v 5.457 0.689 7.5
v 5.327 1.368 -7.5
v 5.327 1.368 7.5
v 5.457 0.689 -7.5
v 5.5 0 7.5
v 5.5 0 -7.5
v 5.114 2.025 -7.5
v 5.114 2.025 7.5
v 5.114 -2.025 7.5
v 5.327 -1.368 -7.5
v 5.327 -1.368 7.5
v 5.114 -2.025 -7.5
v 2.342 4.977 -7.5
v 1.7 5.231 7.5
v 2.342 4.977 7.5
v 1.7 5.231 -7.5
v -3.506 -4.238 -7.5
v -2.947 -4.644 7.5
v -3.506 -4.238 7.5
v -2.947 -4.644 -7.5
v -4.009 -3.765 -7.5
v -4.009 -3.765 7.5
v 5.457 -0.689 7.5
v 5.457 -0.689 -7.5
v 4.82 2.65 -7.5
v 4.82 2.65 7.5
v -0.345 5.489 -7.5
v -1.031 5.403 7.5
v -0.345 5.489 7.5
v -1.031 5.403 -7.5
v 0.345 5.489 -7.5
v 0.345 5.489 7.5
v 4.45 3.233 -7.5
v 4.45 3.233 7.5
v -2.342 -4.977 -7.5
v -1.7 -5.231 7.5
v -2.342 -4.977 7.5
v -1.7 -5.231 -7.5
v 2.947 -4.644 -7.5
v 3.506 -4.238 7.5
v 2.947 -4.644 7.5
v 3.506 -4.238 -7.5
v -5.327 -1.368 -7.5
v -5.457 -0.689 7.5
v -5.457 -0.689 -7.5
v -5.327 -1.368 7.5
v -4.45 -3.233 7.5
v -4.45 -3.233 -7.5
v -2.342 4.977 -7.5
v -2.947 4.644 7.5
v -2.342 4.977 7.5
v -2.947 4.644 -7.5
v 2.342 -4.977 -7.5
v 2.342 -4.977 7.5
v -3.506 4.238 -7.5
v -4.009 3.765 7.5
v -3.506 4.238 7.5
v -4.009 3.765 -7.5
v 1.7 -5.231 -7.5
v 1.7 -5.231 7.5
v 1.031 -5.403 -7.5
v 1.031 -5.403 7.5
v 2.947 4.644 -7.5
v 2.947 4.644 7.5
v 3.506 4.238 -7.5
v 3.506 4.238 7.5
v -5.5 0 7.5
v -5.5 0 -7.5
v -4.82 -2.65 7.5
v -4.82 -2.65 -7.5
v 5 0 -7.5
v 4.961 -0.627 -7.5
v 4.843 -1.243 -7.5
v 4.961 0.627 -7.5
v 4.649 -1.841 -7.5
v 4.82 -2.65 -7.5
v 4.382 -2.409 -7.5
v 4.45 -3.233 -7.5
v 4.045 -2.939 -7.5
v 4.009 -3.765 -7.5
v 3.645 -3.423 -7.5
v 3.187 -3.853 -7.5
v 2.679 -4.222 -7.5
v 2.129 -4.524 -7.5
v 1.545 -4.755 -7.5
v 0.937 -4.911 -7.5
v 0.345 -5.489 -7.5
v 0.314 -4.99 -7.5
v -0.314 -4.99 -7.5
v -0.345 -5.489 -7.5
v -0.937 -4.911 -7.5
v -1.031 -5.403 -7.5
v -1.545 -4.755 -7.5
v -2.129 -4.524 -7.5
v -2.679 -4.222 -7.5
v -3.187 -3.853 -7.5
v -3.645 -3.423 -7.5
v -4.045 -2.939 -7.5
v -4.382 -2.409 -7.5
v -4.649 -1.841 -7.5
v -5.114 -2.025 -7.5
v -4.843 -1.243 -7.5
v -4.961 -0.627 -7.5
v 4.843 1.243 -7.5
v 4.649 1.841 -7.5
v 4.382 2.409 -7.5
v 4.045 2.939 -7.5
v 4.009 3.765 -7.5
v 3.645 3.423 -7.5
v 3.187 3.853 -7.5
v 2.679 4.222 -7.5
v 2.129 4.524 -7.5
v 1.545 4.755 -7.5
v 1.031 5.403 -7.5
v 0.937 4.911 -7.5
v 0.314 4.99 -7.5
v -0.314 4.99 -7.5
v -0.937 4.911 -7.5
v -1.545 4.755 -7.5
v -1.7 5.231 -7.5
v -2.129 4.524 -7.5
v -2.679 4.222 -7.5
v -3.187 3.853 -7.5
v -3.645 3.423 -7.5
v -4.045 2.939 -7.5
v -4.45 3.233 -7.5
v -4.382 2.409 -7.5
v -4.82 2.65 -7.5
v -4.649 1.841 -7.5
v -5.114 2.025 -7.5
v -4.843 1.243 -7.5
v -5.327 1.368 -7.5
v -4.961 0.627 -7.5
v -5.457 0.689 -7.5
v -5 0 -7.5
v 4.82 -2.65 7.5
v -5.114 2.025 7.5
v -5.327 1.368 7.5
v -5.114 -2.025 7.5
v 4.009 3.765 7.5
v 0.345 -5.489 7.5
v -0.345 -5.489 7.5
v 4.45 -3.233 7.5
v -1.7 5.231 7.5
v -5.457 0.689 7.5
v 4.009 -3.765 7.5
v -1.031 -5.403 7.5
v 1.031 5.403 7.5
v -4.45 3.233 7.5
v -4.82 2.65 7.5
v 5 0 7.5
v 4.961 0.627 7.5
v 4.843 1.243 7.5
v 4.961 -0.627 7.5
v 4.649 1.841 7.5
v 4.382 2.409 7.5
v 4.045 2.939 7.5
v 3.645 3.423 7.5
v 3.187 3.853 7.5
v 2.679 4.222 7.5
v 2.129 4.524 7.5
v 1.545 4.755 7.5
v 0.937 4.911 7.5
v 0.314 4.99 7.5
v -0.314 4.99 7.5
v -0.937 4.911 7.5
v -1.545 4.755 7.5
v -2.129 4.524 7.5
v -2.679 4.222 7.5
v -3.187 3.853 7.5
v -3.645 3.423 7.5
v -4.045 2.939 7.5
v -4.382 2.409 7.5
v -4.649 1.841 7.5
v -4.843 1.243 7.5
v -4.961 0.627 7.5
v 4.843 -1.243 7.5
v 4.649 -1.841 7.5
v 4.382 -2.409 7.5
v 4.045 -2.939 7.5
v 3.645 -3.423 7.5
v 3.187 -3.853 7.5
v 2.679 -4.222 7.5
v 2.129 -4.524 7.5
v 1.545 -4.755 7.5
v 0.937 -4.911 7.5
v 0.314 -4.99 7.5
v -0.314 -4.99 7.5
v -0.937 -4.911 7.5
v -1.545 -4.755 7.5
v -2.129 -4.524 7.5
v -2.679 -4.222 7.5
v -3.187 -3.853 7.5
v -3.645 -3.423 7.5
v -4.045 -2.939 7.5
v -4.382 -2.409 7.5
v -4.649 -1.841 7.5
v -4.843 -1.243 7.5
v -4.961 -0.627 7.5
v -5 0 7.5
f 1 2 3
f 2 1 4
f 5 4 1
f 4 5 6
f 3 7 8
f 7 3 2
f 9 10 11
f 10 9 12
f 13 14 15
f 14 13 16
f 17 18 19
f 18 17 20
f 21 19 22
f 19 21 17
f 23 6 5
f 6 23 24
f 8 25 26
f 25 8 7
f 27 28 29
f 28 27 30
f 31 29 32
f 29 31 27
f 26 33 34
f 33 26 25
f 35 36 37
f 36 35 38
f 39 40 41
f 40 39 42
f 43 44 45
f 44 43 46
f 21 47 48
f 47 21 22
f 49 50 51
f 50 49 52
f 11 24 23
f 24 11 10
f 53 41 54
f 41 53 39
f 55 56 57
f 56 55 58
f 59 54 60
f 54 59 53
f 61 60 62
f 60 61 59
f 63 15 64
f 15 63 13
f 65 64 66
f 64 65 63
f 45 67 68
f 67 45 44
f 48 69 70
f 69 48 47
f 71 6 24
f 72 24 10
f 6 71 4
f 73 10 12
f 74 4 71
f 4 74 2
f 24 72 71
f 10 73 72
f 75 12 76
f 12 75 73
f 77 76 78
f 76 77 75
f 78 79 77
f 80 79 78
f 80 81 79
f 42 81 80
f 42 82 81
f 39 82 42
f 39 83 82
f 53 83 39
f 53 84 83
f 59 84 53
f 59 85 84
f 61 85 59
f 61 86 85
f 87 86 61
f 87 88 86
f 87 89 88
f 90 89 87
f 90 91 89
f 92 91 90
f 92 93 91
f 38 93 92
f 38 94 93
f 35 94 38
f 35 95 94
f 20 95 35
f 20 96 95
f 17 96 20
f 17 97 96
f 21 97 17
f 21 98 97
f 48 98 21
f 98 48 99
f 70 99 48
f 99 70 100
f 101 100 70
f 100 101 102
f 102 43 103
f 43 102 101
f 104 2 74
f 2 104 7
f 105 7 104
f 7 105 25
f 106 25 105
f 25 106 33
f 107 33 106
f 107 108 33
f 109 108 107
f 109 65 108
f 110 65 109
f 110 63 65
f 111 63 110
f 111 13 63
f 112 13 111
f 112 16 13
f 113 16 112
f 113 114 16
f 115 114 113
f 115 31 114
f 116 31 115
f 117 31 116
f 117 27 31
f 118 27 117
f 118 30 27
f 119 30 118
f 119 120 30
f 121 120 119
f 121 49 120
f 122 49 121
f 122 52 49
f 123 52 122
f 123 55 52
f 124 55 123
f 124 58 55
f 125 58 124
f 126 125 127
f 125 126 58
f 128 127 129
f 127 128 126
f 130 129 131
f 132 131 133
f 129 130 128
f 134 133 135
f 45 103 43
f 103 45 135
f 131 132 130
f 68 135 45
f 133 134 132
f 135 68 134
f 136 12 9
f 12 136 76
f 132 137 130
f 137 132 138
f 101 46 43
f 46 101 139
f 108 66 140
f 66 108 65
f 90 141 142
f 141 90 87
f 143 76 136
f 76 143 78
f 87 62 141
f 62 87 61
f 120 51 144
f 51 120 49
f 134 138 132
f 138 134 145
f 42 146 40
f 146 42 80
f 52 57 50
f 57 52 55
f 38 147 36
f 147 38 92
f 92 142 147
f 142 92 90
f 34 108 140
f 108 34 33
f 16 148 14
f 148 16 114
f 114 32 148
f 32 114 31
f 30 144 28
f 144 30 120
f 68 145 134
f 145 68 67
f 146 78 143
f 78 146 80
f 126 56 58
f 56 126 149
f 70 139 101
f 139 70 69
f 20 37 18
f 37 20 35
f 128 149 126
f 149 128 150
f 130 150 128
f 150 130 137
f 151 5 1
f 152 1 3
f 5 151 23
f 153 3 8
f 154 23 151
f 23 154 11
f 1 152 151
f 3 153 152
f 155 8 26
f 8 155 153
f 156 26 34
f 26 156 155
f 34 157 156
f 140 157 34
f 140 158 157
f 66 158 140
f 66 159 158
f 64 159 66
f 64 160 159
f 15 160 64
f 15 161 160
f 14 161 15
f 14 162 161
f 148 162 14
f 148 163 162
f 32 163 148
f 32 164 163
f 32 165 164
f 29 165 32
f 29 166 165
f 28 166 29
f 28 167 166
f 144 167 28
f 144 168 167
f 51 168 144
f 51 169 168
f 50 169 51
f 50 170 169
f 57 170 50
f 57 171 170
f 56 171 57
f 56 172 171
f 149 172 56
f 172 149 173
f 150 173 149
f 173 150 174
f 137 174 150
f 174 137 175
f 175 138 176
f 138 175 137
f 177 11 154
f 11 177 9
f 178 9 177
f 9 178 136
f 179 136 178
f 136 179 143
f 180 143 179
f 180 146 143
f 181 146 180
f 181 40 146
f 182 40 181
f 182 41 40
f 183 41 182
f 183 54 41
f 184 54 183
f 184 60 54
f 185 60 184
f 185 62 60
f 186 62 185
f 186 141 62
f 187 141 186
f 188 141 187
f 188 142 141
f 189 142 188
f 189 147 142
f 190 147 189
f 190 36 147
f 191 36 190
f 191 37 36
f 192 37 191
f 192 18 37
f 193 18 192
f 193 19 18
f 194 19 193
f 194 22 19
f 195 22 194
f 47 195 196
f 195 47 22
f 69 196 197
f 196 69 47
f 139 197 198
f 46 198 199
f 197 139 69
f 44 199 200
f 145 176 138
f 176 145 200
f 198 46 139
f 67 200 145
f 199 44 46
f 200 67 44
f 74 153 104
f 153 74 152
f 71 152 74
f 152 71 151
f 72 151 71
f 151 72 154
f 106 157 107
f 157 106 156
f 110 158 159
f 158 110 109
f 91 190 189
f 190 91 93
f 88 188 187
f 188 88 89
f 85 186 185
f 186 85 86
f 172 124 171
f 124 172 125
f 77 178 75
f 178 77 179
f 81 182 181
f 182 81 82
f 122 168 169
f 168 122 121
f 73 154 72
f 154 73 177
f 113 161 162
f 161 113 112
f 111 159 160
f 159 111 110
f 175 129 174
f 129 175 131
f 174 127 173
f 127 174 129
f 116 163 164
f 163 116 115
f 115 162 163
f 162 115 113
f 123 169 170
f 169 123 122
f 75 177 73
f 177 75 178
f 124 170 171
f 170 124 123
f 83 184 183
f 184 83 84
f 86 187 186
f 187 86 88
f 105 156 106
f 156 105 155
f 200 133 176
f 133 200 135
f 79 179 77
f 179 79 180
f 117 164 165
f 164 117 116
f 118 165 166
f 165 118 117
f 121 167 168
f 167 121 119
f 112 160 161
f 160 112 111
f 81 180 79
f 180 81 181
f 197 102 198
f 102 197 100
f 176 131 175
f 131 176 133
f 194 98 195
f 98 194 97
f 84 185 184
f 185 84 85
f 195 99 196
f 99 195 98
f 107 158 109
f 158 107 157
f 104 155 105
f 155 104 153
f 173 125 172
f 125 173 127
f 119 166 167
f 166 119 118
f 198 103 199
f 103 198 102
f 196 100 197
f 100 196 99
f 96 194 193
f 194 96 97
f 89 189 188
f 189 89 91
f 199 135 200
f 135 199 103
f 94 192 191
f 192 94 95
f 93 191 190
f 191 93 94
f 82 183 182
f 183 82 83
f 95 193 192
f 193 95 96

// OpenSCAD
$fn = 50;


difference() {
	union() {
		translate(v = [0, 0, -7.5000000000]) {
			cylinder(h = 15, r = 5.5000000000);
		}
	}
	union() {
		translate(v = [0, 0, -100.0000000000]) {
			cylinder(h = 200, r = 5.0000000000);
		}
	}
}
